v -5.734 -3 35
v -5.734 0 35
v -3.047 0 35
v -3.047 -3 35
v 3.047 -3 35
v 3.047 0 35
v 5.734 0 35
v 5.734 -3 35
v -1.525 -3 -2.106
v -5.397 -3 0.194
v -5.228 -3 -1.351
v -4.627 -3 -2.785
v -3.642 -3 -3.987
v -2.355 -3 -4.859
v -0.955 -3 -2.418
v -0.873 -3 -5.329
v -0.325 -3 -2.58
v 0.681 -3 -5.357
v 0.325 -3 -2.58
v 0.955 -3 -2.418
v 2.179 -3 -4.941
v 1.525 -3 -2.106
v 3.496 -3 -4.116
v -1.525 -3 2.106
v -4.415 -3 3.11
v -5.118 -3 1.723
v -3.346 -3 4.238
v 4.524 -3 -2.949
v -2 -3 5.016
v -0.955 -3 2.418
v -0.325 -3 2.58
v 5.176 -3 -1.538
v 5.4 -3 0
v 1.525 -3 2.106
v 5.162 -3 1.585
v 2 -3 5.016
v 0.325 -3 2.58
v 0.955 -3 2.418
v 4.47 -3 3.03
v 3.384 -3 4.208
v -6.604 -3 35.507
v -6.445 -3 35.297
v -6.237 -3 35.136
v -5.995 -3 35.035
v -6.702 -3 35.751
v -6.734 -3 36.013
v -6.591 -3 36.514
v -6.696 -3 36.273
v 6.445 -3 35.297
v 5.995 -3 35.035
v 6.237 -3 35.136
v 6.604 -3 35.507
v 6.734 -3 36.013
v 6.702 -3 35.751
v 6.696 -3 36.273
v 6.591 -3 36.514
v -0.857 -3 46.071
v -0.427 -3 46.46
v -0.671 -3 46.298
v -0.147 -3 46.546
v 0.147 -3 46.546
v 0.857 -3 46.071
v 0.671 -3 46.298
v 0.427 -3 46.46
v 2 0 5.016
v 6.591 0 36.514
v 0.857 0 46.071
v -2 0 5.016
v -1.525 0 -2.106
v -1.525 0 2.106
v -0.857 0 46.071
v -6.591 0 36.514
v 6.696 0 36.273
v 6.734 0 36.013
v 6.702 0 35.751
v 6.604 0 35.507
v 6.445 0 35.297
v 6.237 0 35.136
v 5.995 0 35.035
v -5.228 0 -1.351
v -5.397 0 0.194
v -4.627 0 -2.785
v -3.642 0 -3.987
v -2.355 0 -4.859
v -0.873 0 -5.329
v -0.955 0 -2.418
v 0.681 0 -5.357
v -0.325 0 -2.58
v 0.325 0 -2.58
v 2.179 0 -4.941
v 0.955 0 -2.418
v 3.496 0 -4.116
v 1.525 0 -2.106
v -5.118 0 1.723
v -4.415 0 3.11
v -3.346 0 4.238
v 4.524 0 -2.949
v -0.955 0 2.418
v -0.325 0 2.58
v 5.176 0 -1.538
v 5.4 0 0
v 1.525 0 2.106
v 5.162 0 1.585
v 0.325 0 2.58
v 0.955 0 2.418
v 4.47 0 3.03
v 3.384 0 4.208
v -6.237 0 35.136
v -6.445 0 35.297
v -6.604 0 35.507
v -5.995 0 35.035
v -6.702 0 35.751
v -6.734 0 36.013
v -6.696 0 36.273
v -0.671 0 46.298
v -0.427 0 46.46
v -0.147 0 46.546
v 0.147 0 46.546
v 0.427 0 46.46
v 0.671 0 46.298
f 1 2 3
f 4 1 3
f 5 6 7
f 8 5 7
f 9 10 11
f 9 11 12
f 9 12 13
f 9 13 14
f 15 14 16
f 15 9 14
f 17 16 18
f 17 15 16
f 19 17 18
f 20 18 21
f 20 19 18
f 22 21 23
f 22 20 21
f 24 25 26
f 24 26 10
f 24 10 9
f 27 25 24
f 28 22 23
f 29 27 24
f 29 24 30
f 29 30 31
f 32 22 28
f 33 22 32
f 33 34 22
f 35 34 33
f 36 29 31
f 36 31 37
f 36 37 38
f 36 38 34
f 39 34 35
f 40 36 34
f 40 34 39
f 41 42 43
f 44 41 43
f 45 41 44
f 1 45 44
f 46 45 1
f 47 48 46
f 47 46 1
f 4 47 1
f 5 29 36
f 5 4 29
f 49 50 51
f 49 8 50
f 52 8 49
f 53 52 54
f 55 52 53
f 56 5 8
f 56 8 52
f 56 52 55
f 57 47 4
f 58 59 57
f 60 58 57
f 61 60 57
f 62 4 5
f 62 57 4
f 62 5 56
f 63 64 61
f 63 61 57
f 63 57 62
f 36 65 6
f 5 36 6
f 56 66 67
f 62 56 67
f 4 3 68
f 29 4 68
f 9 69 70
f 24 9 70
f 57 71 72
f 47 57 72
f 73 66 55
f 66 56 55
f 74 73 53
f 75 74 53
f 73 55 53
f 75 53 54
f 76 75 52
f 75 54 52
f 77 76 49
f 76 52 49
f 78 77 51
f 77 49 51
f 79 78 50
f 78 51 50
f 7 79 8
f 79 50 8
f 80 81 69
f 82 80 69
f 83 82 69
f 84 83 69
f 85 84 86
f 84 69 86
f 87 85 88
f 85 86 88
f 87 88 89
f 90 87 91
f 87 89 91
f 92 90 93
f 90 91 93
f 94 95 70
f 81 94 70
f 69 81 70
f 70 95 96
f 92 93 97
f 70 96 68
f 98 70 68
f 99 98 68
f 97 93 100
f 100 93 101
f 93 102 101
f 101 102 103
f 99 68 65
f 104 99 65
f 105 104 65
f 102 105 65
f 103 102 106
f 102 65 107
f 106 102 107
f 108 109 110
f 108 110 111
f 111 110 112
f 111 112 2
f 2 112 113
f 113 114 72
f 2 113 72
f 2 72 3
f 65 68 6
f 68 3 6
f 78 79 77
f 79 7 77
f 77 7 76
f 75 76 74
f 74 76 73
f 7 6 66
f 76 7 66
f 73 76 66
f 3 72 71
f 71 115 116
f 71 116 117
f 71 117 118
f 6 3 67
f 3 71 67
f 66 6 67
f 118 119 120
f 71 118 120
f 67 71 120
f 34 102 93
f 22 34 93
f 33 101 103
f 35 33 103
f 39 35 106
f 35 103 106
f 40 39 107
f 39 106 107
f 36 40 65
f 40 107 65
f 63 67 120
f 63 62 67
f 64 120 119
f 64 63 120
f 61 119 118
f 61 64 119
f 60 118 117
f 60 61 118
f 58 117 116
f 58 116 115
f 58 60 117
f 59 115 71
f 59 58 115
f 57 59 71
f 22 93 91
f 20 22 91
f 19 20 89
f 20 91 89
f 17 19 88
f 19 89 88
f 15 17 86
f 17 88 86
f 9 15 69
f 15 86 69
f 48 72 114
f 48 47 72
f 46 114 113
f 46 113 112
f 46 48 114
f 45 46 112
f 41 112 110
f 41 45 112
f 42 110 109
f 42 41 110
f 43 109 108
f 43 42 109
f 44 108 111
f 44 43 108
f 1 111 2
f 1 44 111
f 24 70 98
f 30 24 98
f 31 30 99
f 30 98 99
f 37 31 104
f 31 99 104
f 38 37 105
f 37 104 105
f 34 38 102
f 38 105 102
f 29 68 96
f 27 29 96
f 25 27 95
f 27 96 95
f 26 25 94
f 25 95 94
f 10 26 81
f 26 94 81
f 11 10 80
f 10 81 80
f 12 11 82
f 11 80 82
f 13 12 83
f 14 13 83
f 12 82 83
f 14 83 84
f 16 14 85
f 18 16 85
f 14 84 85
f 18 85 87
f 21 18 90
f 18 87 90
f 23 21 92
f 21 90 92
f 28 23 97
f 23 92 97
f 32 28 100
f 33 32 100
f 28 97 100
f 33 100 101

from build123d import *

# Parameters (mm, degrees)
F1_DEPTH = 3
F2_R     = 1
F3_R     = 1
F4_R     = 1


with BuildPart() as f1:
    # F0 (on Front) → F1 (new body)
    with BuildSketch(Plane.XZ):
        with BuildLine():
            ThreePointArc((-2, 5.0159744816), (-3.0298514815, -4.4698993277), (5.4, 0))
            ThreePointArc((5.4, 0), (4.4698993277, 3.0298514815), (2, 5.0159744816))
            Line((2, 5.0159744816), (0, 5.0159744816))
            Line((0, 5.0159744816), (-2, 5.0159744816))
        make_face()
        with BuildLine():
            ThreePointArc((1.525, 2.1057955741), (2.3157072354, 1.1821590418), (2.6, 0))
            ThreePointArc((2.6, 0), (2.3157072354, -1.1821590418), (1.525, -2.1057955741))
            ThreePointArc((1.525, -2.1057955741), (0, -2.6), (-1.525, -2.1057955741))
            ThreePointArc((-1.525, -2.1057955741), (-2.6, 0), (-1.525, 2.1057955741))
            ThreePointArc((-1.525, 2.1057955741), (0, 2.6), (1.525, 2.1057955741))
        make_face(mode=Mode.SUBTRACT)
        with BuildLine():
            Line((0, 5.0159744816), (2, 5.0159744816))
            ThreePointArc((2, 5.0159744816), (0, 5.4), (-2, 5.0159744816))
            Line((-2, 5.0159744816), (0, 5.0159744816))
        make_face()
        with BuildLine():
            ThreePointArc((-2, 5.0159744816), (0, 5.4), (2, 5.0159744816))
            Line((2, 5.0159744816), (3.0470652436, 35))
            Line((3.0470652436, 35), (0, 35))
            Line((0, 35), (-3.0470652436, 35))
            Line((-3.0470652436, 35), (-2, 5.0159744816))
        make_face()
        Polygon((0, 35), (3.0470652436, 35), (7.5, 35), (0, 47.5), (-7.5, 35), (-3.0470652436, 35), align=None)
        with BuildLine():
            ThreePointArc((1.525, -2.1057955741), (2.3157072354, -1.1821590418), (2.6, 0))
            ThreePointArc((2.6, 0), (2.3157072354, 1.1821590418), (1.525, 2.1057955741))
            Line((1.525, 2.1057955741), (1.525, -2.1057955741))
        make_face()
        with BuildLine():
            Line((-1.525, -2.1057955741), (-1.525, 2.1057955741))
            ThreePointArc((-1.525, 2.1057955741), (-2.6, 0), (-1.525, -2.1057955741))
        make_face()
    extrude(amount=F1_DEPTH)

    # F2
    f2_edges = [f1.edges().sort_by_distance(p)[0] for p in [
        (0, -1.5, 47.5),
    ]]
    fillet(f2_edges, radius=F2_R)

    # F3
    f3_edges = [f1.edges().sort_by_distance(p)[0] for p in [
        (-7.5, -1.5, 35),
    ]]
    fillet(f3_edges, radius=F3_R)

    # F4
    f4_edges = [f1.edges().sort_by_distance(p)[0] for p in [
        (7.5, -1.5, 35),
    ]]
    fillet(f4_edges, radius=F4_R)


solid = f1.part
